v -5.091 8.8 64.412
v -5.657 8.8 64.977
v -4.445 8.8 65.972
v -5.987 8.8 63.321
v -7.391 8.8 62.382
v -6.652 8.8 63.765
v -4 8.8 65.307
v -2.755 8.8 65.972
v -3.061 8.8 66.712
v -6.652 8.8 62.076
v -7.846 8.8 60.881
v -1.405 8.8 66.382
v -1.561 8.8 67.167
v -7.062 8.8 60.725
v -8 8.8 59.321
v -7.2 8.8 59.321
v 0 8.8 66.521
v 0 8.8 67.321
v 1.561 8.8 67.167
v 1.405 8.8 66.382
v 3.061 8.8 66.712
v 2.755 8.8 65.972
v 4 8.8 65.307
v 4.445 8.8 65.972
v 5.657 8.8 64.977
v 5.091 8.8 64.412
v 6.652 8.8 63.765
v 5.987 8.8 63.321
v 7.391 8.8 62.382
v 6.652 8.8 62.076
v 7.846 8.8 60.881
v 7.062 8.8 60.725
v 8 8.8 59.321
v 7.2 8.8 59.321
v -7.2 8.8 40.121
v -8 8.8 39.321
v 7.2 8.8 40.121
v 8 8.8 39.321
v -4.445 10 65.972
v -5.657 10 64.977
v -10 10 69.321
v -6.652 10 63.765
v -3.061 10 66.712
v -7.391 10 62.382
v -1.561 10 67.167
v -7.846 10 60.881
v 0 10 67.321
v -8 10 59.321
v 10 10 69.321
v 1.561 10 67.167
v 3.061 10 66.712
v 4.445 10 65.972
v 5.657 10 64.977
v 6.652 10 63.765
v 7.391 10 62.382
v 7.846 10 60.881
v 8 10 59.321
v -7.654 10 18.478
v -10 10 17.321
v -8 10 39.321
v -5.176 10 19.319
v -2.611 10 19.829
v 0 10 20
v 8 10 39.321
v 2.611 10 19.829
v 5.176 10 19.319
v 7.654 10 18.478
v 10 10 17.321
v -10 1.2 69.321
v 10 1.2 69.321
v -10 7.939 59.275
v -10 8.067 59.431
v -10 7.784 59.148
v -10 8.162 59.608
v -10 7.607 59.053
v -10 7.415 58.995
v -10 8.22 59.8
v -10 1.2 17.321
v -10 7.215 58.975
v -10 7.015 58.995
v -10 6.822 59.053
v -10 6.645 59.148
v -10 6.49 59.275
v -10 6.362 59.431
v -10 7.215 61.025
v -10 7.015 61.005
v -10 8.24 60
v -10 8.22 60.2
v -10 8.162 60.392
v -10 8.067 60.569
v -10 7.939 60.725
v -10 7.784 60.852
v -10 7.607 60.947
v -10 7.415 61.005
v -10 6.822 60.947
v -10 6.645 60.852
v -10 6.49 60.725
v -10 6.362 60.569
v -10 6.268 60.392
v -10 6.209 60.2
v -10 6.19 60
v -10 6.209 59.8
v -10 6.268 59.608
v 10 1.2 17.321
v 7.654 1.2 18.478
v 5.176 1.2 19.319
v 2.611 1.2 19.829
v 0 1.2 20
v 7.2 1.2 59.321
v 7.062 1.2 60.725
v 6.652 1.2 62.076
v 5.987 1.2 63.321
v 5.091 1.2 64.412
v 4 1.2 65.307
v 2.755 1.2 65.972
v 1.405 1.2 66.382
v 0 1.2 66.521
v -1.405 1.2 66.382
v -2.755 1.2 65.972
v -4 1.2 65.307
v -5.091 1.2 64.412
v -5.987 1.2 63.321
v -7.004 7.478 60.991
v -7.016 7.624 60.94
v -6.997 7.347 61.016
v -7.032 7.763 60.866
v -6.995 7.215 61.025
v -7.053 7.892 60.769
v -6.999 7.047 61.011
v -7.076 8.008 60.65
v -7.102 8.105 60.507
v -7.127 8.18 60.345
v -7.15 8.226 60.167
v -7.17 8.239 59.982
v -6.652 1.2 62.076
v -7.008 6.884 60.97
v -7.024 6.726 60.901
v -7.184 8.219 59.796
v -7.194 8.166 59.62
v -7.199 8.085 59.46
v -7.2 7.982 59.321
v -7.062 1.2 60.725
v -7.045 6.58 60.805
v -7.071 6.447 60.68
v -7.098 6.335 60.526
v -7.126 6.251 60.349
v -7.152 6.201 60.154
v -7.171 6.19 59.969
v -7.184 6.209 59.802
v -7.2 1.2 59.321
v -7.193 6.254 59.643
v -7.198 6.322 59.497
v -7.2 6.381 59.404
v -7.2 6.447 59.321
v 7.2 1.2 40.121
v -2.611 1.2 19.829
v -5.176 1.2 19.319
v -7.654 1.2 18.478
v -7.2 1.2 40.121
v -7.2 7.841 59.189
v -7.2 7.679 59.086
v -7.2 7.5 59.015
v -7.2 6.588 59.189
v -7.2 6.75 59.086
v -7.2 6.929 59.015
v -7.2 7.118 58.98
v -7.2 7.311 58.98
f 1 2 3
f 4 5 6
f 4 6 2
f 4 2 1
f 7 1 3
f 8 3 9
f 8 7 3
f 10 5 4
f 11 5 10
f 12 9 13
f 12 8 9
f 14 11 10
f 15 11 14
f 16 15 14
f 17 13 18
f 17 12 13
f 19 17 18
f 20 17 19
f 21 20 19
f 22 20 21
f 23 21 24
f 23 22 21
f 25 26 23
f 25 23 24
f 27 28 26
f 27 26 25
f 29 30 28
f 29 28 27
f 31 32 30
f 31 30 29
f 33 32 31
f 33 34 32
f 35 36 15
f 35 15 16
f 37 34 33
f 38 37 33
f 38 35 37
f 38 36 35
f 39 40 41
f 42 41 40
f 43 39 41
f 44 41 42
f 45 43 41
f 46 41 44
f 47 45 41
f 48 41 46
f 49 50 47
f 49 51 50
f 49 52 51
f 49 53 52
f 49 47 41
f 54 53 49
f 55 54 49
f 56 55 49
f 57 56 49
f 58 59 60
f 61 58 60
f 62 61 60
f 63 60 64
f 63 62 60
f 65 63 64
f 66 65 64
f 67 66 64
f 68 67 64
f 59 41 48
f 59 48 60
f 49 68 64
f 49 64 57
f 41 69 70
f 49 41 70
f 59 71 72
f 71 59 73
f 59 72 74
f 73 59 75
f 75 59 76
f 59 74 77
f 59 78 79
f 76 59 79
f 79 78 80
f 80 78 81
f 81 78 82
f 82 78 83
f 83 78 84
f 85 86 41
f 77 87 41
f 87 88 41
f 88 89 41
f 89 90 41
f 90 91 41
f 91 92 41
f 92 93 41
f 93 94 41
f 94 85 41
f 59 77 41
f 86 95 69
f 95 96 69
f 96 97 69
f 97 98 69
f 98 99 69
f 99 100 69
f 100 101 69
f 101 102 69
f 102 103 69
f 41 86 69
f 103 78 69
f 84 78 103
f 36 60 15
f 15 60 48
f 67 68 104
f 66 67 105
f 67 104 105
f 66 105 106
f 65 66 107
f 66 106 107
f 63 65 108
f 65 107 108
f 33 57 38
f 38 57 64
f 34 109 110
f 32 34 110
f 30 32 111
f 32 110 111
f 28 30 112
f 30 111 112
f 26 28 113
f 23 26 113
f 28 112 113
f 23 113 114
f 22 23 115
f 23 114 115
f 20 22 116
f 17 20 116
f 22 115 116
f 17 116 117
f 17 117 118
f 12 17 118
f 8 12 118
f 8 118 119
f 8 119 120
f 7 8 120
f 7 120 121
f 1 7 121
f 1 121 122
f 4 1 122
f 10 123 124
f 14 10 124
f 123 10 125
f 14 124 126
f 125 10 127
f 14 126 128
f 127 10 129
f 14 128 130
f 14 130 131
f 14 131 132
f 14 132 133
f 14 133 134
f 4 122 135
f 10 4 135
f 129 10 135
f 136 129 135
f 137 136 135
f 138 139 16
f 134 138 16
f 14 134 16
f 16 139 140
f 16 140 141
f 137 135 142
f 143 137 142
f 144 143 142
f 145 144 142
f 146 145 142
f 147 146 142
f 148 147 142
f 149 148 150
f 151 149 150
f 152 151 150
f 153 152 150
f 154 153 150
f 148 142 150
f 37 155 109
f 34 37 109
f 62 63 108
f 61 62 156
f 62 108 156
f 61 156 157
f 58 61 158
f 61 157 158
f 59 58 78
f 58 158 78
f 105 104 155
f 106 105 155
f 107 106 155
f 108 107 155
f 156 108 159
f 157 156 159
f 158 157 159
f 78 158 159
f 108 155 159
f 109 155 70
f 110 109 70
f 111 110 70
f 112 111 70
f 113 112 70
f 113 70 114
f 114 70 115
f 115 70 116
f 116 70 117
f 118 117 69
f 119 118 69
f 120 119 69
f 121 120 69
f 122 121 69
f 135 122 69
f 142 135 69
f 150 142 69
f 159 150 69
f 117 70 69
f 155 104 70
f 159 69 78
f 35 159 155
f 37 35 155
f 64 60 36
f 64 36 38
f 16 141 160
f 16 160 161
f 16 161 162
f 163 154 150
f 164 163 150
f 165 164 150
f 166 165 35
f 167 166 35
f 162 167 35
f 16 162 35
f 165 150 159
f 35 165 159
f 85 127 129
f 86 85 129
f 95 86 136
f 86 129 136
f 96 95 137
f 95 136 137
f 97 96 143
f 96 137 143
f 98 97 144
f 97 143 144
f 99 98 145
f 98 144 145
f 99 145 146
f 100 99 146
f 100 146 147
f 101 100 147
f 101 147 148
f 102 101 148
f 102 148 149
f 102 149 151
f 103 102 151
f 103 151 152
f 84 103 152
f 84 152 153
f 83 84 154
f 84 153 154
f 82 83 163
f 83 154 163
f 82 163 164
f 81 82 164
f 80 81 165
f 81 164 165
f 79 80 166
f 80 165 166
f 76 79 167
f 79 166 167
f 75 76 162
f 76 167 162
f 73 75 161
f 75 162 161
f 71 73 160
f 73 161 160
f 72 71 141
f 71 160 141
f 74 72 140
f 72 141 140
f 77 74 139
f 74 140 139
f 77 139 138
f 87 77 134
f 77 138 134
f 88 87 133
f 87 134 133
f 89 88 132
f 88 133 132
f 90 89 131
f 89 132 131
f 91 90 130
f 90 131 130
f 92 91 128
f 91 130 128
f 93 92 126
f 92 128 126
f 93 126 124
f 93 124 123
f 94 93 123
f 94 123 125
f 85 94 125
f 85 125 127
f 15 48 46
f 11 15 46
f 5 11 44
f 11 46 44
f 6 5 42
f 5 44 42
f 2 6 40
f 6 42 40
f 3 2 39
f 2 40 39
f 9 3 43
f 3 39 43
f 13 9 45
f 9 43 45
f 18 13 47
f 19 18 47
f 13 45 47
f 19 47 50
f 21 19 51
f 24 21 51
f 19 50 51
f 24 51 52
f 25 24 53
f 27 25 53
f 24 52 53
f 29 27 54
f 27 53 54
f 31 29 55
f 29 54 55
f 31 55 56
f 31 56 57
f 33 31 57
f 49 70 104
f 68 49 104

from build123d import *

# Parameters (mm, degrees)
EXTRUDE_1_DEPTH          = 10
SKETCH_2_R               = 8
CUT_EXTRUDE_1_DEPTH      = 10
EXTRUDE_START            = -1.2
SKETCH_4_R               = 8
EXTRUDE_2_DEPTH          = 1.2
CUT_EXTRUDE_4_DEPTH      = 8.8
EXTRUDE_START_2          = 1.2
EXTRUDE_3_DEPTH          = 7.6
SKETCH_6_W               = 0.8
SKETCH_6_H               = 0.8
CUT_EXTRUDE_5_DEPTH      = 0.8
CUT_EXTRUDE_6_DEPTH      = 1.2
SKETCH_8_W               = 1.6
SKETCH_8_H               = 0.8
EXTRUDE_4_DEPTH          = 0.8
HOLE_WIZARD_M2_5_2_D     = 2.05
HOLE_WIZARD_M2_5_2_DEPTH = 10
HOLE_WIZARD_M2_5_2_TIP   = 0.615882135


# Read off the part's stored shape, not the designer's step: 填料-伸長3
with BuildPart() as part:
    # 草圖1 → 填料-伸長1 (new body)
    with BuildSketch(Plane(origin=(0, 0, 0), x_dir=(1, 0, 0), z_dir=(0, 1, 0))):
        with BuildLine():
            ThreePointArc((0, -20), (-5.176380902, -19.318516526), (-10, -17.320508076))
            Line((-10, -17.320508076), (-10, -69.320508076))
            Line((-10, -69.320508076), (10, -69.320508076))
            Line((10, -69.320508076), (10, -17.320508076))
            ThreePointArc((10, -17.320508076), (5.176380902, -19.318516526), (0, -20))
        make_face()
    extrude(amount=EXTRUDE_1_DEPTH)

    # 草圖2 → 除料-伸長1 (cut)
    with BuildSketch(Plane(origin=(0, 10, 0), x_dir=(1, 0, 0), z_dir=(0, 1, 0))):
        with Locations(Location((0, -59.320508076, 0), (0, 0, 270))):
            Circle(SKETCH_2_R)
    extrude(amount=-CUT_EXTRUDE_1_DEPTH, mode=Mode.SUBTRACT)

    # 草圖4 → 填料-伸長2 (add)
    with BuildSketch(Plane.XZ.offset(EXTRUDE_START)):
        with Locations(Location((0, 59.320508076, 0), (0, 0, 90))):
            Circle(SKETCH_4_R)
    extrude(amount=EXTRUDE_2_DEPTH)

    # 草圖5 → 除料-伸長4 (cut)
    with BuildSketch(Plane(origin=(0, 10, 0), x_dir=(1, 0, 0), z_dir=(0, 1, 0))):
        with BuildLine():
            Line((-8, -39.320508076), (-8, -59.320508076))
            ThreePointArc((-8, -59.320508076), (0, -51.320508076), (8, -59.320508076))
            Line((8, -59.320508076), (8, -39.320508076))
            Line((8, -39.320508076), (-8, -39.320508076))
        make_face()
    extrude(amount=-CUT_EXTRUDE_4_DEPTH, mode=Mode.SUBTRACT)

    # 填料-伸長3 outline → 填料-伸長3 (add)
    with BuildSketch(Plane(origin=(0, 0, 0), x_dir=(1, 0, 0), z_dir=(0, 1, 0)).offset(EXTRUDE_START_2)):
        with BuildLine():
            Line((-8, -39.320508076), (-8, -59.320508076))
            ThreePointArc((-8, -59.320508076), (0, -67.320508076), (8, -59.320508076))
            Line((8, -59.320508076), (8, -39.320508076))
            Line((8, -39.320508076), (-8, -39.320508076))
        make_face()
        with BuildLine():
            ThreePointArc((7.2, -59.320508076), (0, -66.520508076), (-7.2, -59.320508076))
            Line((-7.2, -59.320508076), (-7.2, -40.120508076))
            Line((-7.2, -40.120508076), (7.2, -40.120508076))
            Line((7.2, -40.120508076), (7.2, -59.320508076))
        make_face(mode=Mode.SUBTRACT)
    extrude(amount=EXTRUDE_3_DEPTH)

    # 草圖6 → 除料-伸長5 (cut)
    with BuildSketch(Plane(origin=(0, 10, 0), x_dir=(1, 0, 0), z_dir=(0, 1, 0))):
        with Locations((0.4, -38.920508076)):
            Rectangle(SKETCH_6_W, SKETCH_6_H)
        with Locations((-0.4, -38.920508076)):
            Rectangle(SKETCH_6_W, SKETCH_6_H)
    extrude(amount=-CUT_EXTRUDE_5_DEPTH, mode=Mode.SUBTRACT)

    # 草圖7 → 除料-伸長6 (cut)
    with BuildSketch(Plane.XZ):
        with BuildLine():
            Line((10, 69.320508076), (10, 17.320508076))
            ThreePointArc((10, 17.320508076), (0, 20), (-10, 17.320508076))
            Line((-10, 17.320508076), (-10, 69.320508076))
            Line((-10, 69.320508076), (10, 69.320508076))
        make_face()
    extrude(amount=-CUT_EXTRUDE_6_DEPTH, mode=Mode.SUBTRACT)

    # 草圖8 → 填料-伸長4 (add)
    with BuildSketch(Plane(origin=(0, 10, 0), x_dir=(1, 0, 0), z_dir=(0, 1, 0))):
        with Locations((0, -38.920508076)):
            Rectangle(SKETCH_8_W, SKETCH_8_H)
    extrude(amount=-EXTRUDE_4_DEPTH)

    # M2.5  螺絲攻的螺孔鑽2
    with Locations(Plane(origin=(-10, 7.214577241, 60), x_dir=(0, 0, -1), z_dir=(-1, 0, 0))):
        with Locations((0, 0)):
            Hole(HOLE_WIZARD_M2_5_2_D / 2, depth=HOLE_WIZARD_M2_5_2_DEPTH)
            with Locations((0, 0, -(HOLE_WIZARD_M2_5_2_DEPTH + HOLE_WIZARD_M2_5_2_TIP / 2))):  # 118° drill point
                Cone(0, HOLE_WIZARD_M2_5_2_D / 2, HOLE_WIZARD_M2_5_2_TIP, mode=Mode.SUBTRACT)


solid = part.part
